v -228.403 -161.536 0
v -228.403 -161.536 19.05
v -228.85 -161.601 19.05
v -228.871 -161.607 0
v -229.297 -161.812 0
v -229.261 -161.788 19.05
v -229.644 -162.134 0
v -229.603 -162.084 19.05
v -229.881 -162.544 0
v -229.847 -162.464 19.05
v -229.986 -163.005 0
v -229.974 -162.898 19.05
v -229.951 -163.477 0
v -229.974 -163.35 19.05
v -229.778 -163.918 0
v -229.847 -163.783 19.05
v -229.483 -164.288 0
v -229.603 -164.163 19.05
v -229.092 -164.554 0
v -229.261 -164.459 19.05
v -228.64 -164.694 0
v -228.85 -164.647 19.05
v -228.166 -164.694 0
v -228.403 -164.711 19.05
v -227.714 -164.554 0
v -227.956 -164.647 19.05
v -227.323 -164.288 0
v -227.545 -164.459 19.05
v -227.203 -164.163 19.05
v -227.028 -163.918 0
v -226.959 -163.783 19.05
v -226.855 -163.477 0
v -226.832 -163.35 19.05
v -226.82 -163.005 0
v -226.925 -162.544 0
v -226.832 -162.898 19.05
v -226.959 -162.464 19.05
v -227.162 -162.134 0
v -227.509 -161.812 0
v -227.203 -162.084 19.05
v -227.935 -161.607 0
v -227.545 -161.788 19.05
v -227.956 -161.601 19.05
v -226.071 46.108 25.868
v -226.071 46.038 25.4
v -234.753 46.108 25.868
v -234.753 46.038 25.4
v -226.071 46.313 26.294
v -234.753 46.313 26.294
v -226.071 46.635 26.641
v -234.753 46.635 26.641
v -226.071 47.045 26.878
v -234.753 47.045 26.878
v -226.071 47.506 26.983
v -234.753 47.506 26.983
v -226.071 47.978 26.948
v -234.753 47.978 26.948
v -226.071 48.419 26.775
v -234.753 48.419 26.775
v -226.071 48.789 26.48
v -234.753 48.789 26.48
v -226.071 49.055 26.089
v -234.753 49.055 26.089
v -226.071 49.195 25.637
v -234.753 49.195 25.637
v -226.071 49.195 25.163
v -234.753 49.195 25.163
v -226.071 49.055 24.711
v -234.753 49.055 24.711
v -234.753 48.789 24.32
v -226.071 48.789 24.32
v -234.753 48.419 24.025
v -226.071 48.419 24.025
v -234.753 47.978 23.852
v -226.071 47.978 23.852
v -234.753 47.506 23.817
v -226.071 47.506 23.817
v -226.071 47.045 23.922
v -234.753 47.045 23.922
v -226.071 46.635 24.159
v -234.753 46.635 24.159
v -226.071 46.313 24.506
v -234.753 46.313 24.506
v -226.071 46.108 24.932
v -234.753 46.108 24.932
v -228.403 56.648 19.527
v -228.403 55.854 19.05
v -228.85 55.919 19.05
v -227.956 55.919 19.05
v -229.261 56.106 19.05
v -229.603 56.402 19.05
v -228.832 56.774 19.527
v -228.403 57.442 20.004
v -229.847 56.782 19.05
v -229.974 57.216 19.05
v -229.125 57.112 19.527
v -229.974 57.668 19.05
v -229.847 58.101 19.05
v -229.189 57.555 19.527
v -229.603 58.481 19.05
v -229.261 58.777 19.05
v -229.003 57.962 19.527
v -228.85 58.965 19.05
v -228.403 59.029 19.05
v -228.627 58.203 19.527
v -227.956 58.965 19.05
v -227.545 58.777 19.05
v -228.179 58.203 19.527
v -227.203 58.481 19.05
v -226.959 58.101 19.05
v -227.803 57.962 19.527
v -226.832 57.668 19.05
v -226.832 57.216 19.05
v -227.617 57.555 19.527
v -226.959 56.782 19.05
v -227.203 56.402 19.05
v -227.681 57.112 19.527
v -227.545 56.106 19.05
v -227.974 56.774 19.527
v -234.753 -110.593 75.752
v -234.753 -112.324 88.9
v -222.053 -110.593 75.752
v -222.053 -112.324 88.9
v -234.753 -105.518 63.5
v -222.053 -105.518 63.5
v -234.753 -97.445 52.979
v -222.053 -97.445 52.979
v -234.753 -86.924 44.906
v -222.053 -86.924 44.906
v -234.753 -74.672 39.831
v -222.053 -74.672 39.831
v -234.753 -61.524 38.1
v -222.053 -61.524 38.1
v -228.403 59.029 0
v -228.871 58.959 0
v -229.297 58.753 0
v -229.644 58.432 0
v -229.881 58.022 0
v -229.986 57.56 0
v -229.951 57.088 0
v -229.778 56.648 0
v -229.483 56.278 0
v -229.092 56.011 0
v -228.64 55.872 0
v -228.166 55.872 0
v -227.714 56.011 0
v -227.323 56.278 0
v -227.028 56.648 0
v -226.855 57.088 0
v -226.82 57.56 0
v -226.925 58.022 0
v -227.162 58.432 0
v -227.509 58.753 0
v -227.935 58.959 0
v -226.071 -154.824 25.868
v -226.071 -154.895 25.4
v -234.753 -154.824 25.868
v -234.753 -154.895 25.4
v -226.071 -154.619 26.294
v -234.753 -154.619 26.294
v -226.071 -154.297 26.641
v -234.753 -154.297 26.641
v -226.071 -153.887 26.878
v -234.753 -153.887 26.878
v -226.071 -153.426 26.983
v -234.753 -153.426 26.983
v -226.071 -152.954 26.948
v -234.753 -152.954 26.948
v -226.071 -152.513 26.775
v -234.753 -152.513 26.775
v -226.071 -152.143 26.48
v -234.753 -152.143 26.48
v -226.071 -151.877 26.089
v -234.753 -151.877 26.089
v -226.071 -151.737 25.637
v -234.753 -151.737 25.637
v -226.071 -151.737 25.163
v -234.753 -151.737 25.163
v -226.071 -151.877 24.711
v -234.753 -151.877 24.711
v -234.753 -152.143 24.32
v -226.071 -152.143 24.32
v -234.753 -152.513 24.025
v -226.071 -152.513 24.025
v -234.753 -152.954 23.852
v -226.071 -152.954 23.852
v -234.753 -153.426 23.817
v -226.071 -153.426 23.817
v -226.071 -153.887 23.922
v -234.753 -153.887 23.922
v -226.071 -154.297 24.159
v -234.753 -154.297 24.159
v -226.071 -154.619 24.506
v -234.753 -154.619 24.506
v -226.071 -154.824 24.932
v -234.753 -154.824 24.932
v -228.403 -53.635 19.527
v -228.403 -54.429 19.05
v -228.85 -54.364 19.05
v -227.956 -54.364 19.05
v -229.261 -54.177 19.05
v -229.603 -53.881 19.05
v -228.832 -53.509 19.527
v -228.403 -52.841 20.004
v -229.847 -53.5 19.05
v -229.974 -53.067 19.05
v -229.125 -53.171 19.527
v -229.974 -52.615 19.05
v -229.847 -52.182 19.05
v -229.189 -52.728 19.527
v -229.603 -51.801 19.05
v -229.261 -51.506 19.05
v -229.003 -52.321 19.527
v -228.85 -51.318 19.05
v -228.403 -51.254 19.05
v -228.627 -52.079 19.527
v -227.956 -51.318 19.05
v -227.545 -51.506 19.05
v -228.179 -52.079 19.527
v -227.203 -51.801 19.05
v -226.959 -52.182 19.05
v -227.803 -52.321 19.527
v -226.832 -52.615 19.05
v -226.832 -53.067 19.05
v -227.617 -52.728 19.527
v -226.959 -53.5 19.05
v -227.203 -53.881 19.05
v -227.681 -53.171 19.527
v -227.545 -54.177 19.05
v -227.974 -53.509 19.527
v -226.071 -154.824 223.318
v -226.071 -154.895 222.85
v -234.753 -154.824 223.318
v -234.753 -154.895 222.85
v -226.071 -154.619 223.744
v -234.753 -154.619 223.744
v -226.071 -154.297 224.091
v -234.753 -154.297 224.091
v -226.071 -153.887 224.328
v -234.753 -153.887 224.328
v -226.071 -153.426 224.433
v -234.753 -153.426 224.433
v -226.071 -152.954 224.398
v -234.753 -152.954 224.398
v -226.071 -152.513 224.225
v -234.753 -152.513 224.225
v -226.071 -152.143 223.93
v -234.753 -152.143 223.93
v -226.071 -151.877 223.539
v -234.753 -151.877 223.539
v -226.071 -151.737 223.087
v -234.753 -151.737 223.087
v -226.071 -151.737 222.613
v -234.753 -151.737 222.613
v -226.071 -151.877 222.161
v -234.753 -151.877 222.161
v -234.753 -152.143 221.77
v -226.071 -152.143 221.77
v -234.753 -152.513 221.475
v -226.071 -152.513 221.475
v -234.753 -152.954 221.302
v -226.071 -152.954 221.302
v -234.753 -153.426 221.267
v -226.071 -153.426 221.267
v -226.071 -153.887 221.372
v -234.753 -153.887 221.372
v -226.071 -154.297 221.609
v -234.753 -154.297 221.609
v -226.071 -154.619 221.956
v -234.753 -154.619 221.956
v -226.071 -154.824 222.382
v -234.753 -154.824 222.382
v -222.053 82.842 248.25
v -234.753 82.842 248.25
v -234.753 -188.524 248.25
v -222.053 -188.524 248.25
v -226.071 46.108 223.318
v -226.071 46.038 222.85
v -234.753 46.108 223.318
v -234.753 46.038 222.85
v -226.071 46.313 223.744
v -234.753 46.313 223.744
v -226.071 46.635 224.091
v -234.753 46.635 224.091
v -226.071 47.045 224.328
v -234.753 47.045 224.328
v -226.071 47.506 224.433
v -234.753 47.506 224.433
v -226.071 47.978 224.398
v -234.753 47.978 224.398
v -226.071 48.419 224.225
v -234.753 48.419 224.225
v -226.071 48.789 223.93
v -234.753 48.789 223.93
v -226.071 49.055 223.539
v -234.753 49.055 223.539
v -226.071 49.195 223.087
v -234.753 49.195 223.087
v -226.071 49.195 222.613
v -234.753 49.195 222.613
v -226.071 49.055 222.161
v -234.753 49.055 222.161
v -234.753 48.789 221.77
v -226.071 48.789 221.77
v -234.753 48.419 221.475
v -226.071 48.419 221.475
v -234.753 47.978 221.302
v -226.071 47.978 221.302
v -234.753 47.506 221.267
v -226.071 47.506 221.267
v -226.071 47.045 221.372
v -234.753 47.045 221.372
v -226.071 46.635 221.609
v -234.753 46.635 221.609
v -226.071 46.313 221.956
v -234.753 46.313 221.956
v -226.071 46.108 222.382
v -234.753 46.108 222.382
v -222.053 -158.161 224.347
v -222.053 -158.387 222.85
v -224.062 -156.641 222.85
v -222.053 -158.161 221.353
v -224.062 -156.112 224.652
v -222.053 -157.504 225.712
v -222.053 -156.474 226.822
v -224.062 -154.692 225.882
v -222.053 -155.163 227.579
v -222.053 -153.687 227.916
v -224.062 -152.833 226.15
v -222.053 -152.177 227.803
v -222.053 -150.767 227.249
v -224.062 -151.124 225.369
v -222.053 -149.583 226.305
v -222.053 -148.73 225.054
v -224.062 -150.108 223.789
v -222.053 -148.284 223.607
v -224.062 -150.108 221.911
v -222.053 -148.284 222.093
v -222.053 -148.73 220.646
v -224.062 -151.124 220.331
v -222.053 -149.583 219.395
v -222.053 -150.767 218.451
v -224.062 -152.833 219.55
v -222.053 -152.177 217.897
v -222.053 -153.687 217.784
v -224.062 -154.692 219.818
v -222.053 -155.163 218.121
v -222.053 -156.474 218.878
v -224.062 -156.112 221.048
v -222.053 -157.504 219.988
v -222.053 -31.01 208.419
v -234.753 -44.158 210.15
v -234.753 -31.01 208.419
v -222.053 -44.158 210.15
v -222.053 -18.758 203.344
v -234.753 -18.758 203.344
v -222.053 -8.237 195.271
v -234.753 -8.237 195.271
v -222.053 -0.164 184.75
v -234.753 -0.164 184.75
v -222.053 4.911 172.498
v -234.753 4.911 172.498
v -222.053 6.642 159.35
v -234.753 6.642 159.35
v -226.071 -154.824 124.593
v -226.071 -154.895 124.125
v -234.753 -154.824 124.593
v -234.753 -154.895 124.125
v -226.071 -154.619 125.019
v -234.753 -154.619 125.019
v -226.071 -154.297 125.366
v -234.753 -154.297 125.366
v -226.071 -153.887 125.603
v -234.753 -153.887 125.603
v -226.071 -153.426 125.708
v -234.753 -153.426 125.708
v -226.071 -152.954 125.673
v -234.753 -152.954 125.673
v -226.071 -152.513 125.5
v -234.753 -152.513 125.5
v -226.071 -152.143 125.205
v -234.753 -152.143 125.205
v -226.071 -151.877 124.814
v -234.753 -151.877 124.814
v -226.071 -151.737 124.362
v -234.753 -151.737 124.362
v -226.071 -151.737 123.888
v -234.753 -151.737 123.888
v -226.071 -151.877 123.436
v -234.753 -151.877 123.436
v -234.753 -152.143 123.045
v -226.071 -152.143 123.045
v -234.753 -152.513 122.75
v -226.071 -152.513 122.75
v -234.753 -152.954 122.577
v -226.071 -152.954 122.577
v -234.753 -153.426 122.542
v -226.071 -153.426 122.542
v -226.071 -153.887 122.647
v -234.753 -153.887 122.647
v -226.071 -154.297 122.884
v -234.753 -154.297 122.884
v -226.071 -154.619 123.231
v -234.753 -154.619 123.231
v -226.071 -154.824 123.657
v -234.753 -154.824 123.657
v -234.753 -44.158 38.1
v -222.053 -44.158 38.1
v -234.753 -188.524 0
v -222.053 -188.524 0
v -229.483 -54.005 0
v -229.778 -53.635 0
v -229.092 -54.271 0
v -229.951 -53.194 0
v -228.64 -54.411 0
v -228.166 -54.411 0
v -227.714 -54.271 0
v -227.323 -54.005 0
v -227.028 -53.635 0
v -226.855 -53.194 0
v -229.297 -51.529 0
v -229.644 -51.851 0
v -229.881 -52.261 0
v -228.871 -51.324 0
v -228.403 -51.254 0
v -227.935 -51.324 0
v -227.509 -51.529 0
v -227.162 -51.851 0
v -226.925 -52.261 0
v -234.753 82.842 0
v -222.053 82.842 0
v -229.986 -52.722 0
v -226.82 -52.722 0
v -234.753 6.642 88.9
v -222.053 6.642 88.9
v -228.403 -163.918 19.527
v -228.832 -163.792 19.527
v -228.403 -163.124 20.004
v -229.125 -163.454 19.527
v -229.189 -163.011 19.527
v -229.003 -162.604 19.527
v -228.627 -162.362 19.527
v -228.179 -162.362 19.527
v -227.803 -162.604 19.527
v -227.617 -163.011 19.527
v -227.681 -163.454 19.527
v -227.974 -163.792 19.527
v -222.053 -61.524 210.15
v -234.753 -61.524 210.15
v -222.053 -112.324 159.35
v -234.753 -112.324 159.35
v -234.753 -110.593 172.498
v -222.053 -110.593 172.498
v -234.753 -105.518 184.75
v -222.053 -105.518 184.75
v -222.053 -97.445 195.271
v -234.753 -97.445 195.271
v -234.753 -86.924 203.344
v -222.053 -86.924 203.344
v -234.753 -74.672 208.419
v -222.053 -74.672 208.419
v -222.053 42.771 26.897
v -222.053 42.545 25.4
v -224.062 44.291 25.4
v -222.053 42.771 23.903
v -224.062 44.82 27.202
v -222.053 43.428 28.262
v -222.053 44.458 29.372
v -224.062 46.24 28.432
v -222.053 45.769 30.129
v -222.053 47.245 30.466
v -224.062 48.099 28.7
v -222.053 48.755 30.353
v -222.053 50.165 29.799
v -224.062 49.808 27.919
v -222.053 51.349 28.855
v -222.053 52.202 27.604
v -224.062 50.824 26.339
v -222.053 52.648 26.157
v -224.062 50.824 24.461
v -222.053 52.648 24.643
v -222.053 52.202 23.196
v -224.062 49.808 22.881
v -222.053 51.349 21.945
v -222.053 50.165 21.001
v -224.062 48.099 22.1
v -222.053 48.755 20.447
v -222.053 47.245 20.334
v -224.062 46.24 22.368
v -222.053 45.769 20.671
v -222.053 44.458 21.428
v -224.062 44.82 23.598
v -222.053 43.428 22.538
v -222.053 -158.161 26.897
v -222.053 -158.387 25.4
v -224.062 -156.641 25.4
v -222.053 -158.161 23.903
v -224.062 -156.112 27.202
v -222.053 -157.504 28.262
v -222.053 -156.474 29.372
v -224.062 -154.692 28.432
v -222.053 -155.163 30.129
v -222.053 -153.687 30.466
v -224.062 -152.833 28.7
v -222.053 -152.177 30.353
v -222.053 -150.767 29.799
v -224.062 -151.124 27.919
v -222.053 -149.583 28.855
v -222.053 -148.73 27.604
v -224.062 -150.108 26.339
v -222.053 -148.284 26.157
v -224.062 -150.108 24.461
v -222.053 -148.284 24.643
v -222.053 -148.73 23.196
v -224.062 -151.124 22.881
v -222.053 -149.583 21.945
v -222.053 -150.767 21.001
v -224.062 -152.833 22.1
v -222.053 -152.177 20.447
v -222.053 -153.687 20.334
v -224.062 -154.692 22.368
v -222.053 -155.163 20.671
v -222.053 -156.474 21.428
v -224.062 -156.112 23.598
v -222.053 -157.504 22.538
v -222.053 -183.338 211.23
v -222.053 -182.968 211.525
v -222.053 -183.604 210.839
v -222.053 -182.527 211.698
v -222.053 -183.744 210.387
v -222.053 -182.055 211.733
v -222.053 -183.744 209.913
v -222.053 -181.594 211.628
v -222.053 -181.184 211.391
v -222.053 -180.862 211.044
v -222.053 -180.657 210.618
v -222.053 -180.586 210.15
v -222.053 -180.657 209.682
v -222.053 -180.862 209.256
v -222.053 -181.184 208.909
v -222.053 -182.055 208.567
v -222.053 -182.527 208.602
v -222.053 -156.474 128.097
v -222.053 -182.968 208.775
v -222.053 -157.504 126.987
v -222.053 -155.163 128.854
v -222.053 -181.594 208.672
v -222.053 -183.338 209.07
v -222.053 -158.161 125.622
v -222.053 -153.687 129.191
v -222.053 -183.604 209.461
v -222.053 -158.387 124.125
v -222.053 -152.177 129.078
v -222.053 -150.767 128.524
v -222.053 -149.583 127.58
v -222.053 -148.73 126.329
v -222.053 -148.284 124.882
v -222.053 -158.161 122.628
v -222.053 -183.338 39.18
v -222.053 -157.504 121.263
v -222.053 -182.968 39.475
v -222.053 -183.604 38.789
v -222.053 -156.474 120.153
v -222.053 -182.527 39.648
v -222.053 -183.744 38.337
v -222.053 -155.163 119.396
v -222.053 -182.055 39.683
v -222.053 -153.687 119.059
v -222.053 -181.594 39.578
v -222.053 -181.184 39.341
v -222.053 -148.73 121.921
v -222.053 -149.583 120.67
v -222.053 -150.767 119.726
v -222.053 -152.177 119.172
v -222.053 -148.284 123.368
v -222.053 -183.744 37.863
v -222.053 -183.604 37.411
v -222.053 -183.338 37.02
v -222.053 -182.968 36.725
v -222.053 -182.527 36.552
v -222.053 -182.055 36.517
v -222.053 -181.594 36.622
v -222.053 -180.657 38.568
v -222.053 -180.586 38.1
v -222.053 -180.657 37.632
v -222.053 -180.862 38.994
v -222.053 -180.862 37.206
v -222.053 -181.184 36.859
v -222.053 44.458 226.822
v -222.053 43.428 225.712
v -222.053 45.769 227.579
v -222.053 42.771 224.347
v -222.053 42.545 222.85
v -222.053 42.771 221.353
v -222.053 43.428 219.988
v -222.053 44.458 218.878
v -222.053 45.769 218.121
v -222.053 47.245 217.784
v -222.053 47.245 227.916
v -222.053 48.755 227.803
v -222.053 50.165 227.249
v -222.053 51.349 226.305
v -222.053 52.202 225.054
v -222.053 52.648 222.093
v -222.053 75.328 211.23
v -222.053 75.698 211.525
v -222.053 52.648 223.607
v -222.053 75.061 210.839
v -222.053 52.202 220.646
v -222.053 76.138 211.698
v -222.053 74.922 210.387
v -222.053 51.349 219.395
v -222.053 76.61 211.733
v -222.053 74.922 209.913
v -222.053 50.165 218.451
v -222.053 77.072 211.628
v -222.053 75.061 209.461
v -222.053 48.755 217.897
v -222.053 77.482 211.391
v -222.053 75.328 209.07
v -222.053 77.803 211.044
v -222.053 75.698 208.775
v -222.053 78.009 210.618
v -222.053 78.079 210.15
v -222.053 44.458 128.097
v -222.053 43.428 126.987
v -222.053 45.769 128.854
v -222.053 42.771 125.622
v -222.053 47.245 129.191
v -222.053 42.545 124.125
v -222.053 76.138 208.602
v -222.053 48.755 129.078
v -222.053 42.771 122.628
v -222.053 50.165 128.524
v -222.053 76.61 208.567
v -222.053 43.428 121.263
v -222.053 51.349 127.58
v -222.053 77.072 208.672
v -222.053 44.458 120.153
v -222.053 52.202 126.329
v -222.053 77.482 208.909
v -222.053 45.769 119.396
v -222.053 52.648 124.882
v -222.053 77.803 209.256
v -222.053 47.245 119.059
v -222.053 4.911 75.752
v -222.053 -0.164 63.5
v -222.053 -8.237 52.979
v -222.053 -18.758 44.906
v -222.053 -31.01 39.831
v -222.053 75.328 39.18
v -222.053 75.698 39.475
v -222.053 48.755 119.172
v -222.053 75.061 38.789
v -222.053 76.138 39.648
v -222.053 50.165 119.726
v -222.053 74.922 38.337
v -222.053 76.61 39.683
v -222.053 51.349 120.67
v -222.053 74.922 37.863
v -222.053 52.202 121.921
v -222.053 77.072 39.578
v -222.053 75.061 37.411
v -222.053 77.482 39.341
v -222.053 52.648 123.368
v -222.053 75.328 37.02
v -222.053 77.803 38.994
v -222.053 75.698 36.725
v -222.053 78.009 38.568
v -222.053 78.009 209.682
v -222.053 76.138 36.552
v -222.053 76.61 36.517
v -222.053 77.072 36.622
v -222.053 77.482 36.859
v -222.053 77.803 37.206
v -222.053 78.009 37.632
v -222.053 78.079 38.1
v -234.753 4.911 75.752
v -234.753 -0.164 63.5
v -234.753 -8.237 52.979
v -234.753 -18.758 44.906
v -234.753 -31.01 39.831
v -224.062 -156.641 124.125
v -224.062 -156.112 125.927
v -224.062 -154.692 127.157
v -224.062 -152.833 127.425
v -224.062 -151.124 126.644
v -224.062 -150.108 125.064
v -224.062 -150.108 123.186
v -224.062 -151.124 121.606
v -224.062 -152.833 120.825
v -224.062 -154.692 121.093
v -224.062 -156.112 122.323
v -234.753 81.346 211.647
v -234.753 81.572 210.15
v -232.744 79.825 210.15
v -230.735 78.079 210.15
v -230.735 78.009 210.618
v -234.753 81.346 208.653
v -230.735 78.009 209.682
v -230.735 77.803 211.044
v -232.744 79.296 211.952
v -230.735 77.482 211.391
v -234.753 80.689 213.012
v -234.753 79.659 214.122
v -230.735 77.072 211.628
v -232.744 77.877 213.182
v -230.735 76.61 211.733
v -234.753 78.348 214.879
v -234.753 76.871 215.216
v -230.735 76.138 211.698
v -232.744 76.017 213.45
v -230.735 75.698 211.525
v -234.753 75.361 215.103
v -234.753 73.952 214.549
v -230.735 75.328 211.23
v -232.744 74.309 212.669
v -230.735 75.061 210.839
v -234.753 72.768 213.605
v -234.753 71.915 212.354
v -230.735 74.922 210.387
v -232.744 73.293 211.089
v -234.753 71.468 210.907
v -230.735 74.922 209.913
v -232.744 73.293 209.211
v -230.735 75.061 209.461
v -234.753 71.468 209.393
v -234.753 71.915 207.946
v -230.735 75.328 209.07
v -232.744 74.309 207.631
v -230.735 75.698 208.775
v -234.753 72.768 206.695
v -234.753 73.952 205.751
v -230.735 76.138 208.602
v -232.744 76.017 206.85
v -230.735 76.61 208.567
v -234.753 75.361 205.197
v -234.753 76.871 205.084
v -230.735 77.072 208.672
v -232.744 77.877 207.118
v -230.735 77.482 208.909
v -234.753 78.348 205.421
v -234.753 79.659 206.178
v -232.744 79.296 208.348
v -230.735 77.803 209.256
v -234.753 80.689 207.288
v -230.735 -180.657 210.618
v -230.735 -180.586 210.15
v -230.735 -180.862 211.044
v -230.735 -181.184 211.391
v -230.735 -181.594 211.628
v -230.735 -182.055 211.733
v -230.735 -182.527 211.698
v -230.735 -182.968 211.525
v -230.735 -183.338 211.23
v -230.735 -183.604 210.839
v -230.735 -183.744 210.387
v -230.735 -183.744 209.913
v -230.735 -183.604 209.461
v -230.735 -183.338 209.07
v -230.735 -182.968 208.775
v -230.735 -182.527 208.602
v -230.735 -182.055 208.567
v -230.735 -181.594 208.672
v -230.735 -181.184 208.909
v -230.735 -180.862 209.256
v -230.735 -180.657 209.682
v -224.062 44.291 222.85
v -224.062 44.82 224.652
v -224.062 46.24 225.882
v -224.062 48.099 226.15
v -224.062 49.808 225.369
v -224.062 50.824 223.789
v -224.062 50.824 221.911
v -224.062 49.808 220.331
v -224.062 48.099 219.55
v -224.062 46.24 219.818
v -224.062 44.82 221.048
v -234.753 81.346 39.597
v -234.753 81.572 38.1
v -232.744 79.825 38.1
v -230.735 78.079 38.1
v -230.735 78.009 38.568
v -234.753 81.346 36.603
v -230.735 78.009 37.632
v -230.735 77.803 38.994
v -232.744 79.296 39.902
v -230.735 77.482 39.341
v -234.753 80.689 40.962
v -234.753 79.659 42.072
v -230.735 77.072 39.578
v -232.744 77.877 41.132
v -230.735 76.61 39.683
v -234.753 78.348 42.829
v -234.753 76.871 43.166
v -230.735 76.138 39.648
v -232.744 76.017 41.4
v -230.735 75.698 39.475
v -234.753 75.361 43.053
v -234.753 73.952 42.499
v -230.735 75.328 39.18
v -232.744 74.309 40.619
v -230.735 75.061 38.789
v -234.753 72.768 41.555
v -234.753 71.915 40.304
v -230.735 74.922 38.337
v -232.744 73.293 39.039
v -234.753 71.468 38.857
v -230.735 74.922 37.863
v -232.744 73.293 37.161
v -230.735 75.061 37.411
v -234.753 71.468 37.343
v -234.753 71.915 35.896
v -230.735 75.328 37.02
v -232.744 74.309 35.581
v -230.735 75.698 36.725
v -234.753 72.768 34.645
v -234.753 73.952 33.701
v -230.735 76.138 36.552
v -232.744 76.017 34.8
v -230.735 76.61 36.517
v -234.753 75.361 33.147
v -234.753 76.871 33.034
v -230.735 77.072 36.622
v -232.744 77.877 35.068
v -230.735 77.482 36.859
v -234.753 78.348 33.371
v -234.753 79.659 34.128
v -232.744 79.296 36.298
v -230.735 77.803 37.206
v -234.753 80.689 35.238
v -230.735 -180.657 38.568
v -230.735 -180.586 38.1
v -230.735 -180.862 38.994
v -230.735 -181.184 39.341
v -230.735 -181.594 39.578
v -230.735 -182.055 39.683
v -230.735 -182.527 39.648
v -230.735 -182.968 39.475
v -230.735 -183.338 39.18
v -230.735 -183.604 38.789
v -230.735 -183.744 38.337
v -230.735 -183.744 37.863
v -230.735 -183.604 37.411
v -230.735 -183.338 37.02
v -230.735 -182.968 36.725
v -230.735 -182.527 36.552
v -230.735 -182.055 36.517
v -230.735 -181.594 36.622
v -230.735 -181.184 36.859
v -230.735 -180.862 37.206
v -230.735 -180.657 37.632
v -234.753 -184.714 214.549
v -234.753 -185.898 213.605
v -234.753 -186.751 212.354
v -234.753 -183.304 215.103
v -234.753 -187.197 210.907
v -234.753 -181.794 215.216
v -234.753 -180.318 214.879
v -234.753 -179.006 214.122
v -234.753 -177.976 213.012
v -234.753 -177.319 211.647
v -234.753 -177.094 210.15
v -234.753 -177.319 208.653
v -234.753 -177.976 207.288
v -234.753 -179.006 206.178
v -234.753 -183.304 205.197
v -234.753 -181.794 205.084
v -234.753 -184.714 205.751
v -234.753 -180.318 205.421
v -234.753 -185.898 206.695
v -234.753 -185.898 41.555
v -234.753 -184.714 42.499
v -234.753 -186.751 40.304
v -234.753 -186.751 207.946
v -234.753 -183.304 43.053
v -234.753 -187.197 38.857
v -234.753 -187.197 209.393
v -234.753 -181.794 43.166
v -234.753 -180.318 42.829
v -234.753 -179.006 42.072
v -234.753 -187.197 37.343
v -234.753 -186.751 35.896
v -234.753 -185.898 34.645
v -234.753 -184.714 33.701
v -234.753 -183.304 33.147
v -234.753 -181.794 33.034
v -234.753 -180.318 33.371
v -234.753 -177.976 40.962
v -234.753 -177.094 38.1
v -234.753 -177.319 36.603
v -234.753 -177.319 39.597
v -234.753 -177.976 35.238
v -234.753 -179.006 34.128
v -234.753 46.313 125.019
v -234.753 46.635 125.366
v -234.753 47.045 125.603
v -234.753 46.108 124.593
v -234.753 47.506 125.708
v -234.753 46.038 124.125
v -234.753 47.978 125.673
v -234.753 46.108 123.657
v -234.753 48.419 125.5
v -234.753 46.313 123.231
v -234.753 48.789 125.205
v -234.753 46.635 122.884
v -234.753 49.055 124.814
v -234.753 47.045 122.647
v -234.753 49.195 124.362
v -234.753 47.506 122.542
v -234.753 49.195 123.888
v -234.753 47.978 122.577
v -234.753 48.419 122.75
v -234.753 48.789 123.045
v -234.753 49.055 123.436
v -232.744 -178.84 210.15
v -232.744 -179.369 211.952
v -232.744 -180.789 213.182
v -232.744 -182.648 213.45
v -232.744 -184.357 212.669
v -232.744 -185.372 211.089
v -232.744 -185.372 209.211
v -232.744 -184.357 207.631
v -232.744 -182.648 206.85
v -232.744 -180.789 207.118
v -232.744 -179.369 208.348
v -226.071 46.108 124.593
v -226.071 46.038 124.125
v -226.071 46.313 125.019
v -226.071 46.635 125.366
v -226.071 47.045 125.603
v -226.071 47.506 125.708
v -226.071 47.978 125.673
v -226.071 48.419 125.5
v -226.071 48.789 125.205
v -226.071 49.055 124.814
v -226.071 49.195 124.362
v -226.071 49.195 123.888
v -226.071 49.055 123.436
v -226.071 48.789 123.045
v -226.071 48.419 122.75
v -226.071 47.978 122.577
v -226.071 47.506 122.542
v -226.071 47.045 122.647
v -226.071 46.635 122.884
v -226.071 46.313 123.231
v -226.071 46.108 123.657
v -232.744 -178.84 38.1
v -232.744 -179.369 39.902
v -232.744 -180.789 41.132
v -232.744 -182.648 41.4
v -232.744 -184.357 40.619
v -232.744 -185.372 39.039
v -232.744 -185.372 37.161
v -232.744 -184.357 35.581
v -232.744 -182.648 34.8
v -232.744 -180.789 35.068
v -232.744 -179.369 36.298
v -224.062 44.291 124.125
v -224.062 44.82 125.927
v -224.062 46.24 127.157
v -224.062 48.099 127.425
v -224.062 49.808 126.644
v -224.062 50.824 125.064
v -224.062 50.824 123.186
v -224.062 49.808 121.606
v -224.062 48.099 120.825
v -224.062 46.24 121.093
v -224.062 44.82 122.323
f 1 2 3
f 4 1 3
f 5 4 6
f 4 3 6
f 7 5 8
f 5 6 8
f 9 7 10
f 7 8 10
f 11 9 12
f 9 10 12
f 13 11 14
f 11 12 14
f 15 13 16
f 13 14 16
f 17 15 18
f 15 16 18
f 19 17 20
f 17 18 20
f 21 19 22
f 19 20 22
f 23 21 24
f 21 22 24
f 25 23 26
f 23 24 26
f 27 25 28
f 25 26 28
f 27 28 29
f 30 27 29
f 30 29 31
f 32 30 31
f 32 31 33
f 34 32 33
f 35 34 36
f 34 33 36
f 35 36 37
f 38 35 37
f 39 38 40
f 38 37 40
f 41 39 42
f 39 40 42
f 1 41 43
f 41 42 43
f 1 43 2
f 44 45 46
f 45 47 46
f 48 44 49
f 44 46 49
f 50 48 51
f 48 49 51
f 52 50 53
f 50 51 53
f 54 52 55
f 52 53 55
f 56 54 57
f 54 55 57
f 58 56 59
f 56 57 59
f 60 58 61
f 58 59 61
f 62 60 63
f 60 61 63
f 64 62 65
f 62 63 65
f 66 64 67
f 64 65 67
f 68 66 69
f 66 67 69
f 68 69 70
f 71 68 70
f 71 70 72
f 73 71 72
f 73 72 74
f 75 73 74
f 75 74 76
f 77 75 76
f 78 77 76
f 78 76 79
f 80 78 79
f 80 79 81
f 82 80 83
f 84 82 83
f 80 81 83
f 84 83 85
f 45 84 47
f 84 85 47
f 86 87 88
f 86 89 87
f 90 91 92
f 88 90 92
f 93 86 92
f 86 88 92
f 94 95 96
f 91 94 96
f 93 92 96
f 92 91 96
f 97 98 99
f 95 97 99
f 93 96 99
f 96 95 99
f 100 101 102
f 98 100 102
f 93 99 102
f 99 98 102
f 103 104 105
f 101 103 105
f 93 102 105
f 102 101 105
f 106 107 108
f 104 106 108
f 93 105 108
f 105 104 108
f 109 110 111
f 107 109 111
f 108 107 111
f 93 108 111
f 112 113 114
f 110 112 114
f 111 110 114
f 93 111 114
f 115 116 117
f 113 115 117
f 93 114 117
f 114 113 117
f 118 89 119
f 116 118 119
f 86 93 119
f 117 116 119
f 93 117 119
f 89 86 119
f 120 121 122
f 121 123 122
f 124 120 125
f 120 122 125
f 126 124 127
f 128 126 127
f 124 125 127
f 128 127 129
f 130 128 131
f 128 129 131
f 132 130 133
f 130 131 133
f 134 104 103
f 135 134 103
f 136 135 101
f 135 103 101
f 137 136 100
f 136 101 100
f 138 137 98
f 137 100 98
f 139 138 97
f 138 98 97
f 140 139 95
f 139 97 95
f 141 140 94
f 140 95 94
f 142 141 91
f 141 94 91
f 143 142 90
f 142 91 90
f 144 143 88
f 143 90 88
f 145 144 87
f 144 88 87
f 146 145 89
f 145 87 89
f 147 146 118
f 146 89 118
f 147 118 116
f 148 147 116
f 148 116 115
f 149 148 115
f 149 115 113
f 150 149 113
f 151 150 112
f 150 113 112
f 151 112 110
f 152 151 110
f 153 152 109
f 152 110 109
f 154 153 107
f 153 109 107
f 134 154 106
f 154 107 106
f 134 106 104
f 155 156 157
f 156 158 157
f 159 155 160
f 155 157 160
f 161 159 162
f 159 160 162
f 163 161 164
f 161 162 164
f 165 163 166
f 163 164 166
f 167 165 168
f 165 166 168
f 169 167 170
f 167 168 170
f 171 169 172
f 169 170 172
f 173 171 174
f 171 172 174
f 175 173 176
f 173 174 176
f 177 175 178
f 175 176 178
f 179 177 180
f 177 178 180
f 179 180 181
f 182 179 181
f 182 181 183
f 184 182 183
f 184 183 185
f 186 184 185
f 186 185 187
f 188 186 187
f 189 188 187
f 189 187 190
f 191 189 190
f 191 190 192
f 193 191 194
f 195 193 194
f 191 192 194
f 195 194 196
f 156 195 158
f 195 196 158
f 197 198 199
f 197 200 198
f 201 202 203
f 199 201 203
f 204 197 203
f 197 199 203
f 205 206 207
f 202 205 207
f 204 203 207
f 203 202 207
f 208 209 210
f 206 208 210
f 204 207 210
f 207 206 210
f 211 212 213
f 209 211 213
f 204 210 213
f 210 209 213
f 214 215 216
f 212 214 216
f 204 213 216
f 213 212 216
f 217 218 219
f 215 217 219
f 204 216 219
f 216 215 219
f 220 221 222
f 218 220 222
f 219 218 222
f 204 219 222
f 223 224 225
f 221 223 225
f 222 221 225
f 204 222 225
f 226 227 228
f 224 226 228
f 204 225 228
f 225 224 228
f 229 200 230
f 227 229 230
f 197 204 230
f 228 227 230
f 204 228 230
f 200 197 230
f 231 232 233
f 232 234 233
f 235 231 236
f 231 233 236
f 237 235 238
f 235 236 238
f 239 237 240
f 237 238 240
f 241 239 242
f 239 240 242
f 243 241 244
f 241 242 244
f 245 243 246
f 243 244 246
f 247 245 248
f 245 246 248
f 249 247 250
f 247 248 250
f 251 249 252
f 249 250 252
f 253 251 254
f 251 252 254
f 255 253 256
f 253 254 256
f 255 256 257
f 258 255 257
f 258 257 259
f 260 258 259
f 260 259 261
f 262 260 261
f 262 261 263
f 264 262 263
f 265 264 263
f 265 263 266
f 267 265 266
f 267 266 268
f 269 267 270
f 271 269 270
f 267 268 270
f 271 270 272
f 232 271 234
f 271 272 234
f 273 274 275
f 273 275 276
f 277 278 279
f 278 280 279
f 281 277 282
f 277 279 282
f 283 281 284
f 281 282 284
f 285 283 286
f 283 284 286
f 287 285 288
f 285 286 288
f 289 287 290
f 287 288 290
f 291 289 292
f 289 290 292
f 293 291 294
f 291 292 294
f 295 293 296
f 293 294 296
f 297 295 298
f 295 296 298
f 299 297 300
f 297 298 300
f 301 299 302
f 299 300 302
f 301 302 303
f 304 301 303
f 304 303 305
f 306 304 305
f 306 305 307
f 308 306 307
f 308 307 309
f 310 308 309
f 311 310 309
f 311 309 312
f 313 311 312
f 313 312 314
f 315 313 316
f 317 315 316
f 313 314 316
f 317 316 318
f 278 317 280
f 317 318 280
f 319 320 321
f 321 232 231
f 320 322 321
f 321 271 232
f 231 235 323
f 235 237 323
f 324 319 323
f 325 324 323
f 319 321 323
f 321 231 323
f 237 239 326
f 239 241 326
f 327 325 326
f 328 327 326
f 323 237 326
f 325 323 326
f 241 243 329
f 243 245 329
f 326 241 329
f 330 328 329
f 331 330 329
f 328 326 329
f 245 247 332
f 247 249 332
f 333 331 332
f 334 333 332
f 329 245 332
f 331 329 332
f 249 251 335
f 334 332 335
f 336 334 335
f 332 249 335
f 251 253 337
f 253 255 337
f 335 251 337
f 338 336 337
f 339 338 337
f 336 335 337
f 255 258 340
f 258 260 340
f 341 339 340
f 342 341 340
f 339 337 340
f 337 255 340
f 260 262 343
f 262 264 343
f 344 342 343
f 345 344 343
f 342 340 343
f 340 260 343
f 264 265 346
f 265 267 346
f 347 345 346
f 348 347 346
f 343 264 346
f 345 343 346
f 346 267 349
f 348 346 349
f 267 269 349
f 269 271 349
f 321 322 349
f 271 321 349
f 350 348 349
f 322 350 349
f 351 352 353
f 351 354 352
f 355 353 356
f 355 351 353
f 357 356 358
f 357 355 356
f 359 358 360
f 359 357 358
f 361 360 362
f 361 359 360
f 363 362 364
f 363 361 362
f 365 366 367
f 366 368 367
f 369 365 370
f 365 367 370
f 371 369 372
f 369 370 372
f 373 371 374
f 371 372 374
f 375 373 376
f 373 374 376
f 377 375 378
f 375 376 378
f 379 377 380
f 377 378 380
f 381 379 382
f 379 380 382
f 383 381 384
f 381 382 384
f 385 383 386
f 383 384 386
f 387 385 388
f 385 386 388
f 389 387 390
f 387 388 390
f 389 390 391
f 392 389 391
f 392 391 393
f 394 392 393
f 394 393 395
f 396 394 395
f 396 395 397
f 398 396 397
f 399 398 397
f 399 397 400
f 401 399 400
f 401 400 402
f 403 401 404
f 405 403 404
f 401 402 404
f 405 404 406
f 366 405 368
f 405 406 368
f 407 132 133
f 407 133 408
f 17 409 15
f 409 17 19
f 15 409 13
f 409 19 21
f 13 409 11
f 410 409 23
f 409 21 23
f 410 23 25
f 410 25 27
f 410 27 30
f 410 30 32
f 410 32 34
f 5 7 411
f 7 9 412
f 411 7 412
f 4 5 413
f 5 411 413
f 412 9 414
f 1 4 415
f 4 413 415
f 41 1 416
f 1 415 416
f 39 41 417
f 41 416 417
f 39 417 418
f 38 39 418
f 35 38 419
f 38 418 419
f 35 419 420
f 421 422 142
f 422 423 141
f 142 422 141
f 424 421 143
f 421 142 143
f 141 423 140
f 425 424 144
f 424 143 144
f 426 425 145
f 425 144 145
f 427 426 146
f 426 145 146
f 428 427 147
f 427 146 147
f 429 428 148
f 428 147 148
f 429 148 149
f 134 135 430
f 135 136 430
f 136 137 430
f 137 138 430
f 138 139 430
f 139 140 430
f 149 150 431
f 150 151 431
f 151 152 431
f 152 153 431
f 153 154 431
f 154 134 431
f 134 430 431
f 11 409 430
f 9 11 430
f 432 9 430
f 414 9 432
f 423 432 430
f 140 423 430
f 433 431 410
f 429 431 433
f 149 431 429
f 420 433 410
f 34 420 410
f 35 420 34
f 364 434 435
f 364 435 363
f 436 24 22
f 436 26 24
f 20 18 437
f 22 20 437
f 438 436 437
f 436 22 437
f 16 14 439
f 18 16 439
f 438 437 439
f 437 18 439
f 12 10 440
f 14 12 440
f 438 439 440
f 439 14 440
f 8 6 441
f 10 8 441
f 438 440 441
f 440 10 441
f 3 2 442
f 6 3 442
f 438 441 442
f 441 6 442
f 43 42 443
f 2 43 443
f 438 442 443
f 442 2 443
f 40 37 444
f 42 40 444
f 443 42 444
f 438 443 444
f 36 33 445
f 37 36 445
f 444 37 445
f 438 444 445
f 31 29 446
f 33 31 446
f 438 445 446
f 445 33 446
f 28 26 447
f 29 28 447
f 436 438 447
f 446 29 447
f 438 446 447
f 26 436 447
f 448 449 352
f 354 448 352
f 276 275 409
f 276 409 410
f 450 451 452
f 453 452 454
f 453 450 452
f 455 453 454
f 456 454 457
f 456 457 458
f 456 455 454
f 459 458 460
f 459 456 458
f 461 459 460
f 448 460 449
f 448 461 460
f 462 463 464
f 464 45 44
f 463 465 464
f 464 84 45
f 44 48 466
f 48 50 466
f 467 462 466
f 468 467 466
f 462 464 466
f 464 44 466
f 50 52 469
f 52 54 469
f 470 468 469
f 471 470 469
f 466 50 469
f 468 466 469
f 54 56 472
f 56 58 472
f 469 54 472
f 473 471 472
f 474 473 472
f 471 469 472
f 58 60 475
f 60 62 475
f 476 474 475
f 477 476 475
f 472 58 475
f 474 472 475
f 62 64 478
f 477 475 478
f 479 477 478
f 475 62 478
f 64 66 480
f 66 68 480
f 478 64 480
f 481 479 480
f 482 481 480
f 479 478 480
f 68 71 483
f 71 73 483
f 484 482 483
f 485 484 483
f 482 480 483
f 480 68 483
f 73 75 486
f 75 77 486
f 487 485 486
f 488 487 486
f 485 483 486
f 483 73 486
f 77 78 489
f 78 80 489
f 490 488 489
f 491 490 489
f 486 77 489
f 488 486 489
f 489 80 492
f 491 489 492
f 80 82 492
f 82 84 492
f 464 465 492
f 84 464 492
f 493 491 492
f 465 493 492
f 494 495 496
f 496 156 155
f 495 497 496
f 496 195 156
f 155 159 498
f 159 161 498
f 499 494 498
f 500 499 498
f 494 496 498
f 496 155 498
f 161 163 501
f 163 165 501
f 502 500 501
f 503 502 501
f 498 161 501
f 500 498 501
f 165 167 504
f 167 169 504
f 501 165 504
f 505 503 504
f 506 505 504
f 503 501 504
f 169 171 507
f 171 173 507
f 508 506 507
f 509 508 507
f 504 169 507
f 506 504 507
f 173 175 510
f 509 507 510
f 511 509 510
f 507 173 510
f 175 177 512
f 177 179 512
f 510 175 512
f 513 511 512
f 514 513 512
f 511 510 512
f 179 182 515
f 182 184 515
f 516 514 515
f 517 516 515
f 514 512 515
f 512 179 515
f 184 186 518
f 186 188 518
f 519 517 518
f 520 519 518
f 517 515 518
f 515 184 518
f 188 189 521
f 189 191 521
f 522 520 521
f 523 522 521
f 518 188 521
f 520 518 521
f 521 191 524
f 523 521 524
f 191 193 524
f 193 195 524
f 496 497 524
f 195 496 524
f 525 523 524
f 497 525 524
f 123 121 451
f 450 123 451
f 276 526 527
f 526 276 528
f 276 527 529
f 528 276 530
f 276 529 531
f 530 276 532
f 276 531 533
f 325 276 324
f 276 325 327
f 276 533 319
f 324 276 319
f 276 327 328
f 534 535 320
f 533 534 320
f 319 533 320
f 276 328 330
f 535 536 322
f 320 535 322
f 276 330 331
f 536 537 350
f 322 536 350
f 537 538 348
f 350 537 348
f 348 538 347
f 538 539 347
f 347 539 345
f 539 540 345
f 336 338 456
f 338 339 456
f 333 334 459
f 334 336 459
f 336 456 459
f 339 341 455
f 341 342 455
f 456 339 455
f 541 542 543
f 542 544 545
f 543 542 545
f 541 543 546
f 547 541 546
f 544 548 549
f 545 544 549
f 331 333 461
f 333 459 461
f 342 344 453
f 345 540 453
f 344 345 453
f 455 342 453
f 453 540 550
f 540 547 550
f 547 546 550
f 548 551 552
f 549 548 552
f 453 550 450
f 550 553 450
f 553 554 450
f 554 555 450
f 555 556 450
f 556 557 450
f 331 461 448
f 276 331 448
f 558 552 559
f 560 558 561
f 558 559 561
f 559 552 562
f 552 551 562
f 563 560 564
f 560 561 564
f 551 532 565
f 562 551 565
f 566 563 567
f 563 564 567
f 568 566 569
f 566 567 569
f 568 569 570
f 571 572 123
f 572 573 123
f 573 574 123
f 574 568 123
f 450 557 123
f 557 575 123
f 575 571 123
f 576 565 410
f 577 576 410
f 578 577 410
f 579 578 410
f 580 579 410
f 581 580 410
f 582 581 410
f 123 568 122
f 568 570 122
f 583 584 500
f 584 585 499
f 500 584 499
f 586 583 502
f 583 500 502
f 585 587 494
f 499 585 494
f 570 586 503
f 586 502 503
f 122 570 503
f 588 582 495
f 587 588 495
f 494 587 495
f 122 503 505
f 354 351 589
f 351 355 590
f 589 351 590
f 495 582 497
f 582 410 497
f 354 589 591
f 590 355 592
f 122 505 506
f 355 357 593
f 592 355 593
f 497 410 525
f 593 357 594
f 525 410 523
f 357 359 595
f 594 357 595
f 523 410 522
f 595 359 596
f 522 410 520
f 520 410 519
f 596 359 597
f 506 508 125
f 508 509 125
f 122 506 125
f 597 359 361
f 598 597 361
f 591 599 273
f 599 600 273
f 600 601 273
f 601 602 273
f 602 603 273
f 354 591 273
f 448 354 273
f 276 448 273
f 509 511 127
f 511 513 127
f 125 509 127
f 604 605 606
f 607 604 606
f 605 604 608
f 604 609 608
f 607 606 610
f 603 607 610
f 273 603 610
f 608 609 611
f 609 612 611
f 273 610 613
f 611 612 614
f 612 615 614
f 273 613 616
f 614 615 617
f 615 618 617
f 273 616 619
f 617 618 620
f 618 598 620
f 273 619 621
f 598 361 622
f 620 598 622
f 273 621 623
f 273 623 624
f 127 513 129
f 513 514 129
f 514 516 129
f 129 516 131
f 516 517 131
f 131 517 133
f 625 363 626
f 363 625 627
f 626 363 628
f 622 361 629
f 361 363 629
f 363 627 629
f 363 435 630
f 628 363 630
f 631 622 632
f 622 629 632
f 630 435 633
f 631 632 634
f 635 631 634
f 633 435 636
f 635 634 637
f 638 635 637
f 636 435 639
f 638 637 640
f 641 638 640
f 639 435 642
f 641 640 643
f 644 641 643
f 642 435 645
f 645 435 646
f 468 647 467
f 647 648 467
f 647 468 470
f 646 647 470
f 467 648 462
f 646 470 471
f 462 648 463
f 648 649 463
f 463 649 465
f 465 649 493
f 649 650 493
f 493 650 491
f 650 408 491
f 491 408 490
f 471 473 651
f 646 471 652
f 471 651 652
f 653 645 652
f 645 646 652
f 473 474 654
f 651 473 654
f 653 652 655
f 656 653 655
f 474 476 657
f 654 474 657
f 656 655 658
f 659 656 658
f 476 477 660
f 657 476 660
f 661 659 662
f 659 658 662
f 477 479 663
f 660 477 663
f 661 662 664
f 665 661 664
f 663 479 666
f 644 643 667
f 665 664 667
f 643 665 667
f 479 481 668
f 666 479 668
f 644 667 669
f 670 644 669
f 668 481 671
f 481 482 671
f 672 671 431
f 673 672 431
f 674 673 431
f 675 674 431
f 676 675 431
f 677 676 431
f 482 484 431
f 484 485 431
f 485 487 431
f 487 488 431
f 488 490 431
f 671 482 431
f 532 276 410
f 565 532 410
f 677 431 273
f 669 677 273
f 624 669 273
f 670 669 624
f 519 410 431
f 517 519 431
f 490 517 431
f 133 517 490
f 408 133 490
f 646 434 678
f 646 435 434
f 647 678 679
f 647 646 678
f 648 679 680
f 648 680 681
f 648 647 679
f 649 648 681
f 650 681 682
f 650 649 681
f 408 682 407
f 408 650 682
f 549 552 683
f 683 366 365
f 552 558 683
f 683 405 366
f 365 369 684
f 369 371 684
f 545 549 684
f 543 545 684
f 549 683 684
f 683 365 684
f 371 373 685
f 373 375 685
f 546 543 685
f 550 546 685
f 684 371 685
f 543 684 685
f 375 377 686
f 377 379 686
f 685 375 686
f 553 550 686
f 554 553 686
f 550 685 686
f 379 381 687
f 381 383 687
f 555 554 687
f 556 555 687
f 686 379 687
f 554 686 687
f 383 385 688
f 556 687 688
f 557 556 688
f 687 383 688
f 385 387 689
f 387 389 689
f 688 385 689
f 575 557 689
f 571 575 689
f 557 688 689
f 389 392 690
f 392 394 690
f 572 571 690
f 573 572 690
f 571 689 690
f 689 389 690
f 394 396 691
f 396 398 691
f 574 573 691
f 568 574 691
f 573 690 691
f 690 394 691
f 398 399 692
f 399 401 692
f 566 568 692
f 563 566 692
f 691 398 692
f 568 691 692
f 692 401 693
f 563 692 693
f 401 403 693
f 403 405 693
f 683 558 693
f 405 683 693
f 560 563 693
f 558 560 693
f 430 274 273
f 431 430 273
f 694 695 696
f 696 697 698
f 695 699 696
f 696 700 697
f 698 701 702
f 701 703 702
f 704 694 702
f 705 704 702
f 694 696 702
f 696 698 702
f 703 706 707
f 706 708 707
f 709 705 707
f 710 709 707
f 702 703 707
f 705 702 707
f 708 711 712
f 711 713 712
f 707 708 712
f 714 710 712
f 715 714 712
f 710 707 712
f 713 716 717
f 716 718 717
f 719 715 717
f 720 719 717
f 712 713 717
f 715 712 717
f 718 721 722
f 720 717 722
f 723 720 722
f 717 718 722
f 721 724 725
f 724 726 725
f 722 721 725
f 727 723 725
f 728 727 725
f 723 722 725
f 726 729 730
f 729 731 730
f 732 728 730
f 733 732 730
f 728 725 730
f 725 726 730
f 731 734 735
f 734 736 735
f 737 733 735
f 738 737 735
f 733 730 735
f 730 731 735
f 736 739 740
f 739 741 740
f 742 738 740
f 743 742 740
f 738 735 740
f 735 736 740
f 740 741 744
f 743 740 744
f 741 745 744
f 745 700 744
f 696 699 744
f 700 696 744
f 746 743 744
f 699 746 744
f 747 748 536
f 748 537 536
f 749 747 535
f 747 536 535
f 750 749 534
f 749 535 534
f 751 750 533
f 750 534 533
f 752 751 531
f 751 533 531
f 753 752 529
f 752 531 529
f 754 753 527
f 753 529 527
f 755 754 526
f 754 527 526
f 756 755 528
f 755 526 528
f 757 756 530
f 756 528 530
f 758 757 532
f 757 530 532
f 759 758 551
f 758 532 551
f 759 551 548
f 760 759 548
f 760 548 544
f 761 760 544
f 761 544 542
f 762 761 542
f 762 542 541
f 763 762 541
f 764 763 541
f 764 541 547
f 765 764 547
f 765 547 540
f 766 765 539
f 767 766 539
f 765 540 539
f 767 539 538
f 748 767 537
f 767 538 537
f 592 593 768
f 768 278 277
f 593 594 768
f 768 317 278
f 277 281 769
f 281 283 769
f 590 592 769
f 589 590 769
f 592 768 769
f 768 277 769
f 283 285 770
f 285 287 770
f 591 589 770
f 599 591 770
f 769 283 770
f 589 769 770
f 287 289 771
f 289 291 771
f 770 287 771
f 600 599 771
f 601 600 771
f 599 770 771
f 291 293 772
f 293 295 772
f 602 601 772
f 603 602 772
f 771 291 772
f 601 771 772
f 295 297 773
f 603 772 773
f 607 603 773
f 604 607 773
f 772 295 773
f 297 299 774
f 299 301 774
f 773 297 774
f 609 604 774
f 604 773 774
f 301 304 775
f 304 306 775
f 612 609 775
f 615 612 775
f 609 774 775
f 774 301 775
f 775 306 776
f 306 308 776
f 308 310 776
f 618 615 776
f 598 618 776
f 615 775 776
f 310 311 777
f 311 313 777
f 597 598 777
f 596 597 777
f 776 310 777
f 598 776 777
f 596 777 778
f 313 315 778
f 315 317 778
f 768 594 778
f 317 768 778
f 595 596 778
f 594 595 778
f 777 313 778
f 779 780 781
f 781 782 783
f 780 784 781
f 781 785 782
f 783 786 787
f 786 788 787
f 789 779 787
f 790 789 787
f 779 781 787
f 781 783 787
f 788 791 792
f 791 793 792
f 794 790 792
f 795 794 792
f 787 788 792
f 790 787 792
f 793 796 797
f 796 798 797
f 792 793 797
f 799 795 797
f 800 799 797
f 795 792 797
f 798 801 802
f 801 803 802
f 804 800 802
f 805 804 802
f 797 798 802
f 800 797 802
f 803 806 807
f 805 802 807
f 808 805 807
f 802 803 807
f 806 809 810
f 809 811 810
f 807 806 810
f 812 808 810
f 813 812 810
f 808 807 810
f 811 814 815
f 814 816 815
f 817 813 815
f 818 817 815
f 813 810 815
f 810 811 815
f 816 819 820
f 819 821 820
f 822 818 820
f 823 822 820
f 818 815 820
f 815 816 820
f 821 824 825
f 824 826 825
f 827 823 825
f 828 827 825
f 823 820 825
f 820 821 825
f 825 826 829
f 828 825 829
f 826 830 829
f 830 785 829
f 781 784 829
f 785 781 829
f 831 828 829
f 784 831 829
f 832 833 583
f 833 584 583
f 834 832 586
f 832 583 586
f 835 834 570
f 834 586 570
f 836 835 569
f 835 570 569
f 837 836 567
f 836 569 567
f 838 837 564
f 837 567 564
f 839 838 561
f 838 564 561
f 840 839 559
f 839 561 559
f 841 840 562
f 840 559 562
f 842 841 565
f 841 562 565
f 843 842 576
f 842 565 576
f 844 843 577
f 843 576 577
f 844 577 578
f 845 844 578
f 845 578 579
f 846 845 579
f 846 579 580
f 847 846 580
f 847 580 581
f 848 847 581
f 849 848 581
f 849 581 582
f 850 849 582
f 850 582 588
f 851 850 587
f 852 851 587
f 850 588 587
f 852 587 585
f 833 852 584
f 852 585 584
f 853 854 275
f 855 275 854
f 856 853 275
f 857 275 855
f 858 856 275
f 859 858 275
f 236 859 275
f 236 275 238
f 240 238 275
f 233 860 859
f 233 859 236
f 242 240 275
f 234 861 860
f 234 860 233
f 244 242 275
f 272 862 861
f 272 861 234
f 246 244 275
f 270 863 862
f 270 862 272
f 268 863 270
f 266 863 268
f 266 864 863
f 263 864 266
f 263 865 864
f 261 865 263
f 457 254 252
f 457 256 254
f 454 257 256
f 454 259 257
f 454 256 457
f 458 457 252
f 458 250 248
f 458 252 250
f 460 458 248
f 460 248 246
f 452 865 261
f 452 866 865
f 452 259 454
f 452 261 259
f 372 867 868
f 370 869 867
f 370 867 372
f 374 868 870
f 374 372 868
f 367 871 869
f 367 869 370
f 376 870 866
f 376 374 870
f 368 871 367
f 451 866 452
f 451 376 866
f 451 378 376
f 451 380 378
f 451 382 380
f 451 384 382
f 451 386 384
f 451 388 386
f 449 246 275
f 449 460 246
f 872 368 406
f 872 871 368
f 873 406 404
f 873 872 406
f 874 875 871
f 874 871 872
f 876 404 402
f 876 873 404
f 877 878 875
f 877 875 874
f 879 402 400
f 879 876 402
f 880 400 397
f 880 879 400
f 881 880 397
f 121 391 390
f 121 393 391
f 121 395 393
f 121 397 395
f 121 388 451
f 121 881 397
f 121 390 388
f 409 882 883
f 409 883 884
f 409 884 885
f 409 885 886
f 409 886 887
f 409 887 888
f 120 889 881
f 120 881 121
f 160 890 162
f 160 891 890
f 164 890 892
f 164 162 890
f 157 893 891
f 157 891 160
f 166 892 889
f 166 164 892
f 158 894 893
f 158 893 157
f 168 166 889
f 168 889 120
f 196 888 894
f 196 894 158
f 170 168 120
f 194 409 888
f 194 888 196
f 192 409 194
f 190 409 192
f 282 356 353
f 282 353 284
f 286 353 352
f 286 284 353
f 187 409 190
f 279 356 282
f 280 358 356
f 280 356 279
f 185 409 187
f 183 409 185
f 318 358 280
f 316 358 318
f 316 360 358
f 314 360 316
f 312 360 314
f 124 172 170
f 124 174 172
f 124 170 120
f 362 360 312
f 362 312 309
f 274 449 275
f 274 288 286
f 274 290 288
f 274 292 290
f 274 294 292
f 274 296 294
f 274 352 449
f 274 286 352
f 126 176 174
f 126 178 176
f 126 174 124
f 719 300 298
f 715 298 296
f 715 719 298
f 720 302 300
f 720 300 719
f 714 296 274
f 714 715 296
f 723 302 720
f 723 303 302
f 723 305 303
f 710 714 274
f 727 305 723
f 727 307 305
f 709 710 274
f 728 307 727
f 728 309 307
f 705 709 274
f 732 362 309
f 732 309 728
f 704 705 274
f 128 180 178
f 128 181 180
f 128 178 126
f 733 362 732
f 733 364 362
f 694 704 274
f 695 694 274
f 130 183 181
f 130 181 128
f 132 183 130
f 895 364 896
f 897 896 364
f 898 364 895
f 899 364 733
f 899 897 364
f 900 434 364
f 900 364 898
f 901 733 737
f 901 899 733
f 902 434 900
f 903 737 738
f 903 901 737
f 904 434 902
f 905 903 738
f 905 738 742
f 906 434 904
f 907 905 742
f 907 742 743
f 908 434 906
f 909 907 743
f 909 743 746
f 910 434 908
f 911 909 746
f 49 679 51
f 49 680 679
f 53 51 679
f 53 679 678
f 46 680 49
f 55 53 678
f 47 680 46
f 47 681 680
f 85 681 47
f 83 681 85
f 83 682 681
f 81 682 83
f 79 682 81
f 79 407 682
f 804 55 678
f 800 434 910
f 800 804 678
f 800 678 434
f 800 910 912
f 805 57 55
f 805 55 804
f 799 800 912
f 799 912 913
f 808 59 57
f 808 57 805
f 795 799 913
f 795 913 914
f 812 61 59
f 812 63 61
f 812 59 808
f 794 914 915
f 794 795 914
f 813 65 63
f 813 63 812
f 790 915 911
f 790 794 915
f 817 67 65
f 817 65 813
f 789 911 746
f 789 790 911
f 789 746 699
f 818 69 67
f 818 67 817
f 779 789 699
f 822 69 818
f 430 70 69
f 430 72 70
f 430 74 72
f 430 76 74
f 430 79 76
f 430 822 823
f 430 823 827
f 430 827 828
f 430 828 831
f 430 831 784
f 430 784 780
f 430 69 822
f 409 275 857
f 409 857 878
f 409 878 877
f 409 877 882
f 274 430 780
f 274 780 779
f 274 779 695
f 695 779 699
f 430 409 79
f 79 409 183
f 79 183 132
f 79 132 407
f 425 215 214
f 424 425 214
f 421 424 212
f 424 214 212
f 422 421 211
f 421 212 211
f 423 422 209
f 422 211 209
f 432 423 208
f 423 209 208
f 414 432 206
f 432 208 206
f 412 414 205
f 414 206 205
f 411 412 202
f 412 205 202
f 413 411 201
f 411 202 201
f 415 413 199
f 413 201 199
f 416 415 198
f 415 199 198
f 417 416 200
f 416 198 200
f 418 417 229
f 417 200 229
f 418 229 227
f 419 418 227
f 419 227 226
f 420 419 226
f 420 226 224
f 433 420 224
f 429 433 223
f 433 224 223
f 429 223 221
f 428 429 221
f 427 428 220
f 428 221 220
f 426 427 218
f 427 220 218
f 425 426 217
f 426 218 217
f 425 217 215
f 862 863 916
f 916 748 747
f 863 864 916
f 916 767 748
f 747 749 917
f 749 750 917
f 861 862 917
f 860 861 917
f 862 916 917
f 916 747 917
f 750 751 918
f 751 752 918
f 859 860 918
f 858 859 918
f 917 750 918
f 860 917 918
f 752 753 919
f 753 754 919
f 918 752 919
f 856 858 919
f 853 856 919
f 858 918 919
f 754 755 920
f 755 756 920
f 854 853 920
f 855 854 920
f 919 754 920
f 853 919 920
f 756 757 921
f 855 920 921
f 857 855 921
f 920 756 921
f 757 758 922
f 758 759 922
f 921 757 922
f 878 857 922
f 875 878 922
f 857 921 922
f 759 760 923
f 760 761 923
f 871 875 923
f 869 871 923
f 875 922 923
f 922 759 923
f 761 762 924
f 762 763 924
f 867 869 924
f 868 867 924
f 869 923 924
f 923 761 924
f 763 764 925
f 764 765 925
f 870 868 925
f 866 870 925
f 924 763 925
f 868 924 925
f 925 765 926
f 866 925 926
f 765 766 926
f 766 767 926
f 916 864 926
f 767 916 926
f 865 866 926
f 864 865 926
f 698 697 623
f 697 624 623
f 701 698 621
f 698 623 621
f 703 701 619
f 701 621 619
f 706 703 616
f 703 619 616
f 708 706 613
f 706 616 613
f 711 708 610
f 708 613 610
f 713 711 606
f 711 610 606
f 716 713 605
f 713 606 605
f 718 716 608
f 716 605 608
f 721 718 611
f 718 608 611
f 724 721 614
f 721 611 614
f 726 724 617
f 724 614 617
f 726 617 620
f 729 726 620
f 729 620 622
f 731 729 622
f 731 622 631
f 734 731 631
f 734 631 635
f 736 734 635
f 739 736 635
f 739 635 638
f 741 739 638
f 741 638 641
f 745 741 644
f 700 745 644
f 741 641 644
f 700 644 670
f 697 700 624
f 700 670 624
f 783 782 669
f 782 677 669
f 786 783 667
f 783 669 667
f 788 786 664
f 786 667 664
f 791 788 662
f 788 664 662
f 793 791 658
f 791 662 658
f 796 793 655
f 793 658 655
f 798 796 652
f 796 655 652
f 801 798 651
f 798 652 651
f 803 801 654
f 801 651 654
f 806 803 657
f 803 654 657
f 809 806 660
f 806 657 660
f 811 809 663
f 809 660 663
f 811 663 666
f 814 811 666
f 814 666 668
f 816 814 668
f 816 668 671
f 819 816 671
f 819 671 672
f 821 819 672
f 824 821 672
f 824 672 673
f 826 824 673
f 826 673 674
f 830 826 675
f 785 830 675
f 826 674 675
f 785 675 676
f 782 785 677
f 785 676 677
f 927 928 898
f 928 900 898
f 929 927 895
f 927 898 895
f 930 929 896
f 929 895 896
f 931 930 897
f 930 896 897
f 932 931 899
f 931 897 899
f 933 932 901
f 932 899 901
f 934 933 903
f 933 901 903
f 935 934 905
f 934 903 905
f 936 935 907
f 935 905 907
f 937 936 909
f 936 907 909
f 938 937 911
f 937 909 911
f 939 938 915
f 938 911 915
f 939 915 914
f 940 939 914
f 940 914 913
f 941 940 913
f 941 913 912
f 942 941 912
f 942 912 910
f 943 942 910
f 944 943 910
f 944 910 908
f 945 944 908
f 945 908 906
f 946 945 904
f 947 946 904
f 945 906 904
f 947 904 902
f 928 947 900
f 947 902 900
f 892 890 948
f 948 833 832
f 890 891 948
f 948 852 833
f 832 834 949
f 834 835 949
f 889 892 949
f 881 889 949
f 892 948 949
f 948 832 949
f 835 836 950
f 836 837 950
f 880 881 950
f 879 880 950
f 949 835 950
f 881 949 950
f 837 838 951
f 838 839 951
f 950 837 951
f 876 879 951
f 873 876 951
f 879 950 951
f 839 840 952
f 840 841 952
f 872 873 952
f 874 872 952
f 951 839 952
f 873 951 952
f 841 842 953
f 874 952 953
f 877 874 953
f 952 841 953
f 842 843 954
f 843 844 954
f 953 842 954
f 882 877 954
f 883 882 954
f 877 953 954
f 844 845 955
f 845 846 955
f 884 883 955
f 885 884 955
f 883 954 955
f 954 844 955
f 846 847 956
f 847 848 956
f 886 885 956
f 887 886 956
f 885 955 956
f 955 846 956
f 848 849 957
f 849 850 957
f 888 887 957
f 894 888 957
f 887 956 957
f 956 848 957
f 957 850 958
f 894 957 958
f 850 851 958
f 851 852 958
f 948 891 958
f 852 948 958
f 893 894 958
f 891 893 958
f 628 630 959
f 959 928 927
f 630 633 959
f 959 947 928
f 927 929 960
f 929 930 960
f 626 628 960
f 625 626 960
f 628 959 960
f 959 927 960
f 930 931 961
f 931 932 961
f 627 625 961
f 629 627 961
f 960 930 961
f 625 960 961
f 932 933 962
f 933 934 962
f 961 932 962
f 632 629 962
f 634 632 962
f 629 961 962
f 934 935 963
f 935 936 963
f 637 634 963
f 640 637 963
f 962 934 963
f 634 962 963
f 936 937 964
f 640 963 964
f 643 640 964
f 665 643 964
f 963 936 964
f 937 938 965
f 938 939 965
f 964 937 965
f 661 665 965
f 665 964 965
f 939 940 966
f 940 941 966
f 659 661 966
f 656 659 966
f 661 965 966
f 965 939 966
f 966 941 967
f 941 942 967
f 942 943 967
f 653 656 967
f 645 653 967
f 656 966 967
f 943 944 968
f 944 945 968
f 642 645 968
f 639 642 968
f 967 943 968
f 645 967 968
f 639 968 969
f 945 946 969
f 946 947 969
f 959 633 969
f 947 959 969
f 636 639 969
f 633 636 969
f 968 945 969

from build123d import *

# Parameters (mm, degrees)
SKETCH1_W           = 12.7
SKETCH1_H           = 271.365530146
BOSS_EXTRUDE1_DEPTH = 248.25
SKETCH2_W           = 172.05
SKETCH2_H           = 118.965530146
CUT_EXTRUDE1_DEPTH  = 13.7
FILLET1_R           = 50.8
HOLE1_D             = 3.175
HOLE1_DEPTH         = 31.75
HOLE1_CSINK_D       = 10.16
HOLE1_CSINK_ANGLE   = 82
HOLE1_TIP           = 0.953866233
HOLE2_D             = 3.175
HOLE2_DEPTH         = 31.75
HOLE2_CSINK_D       = 10.16
HOLE2_CSINK_ANGLE   = 82
HOLE2_TIP           = 0.953866233
HOLE3_D             = 3.175
HOLE3_DEPTH         = 31.75
HOLE3_CSINK_D       = 10.16
HOLE3_CSINK_ANGLE   = 82
HOLE3_TIP           = 0.953866233


with BuildPart() as part:
    # Sketch1 → Boss-Extrude1 (new body)
    with BuildSketch(Plane.XY):
        with Locations((-228.402967181, -52.841023691)):
            Rectangle(SKETCH1_W, SKETCH1_H)
    extrude(amount=BOSS_EXTRUDE1_DEPTH)

    # Sketch2 → Cut-Extrude1 (cut, through all)
    with BuildSketch(Plane.ZY.offset(234.752967181)):
        with Locations((124.125, -52.841023691)):
            Rectangle(SKETCH2_W, SKETCH2_H)
    extrude(amount=-CUT_EXTRUDE1_DEPTH, mode=Mode.SUBTRACT)

    # Fillet1
    fillet1_edges = [part.edges().sort_by_distance(p)[0] for p in [
        (-228.402967181, 6.641741382, 210.15),
        (-228.402967181, -112.323788764, 210.15),
        (-228.402967181, -112.323788764, 38.1),
        (-228.402967181, 6.641741382, 38.1),
    ]]
    fillet(fillet1_edges, radius=FILLET1_R)

    # Hole1
    with Locations(Plane(origin=(181.039434513, -52.974999997, -12.7), x_dir=(0, -1, 0), z_dir=(0, 0, -1))):
        with Locations((129.198788767, 384.042401694), (-129.466741379, 384.042401694), (-129.466741379, 304.786761906), (-110.416741379, 409.442401694), (-0.133976306, 409.442401694), (110.148788767, 409.442401694), (129.198788767, 304.786761906)):
            CounterSinkHole(HOLE1_D / 2, HOLE1_CSINK_D / 2, depth=HOLE1_DEPTH, counter_sink_angle=HOLE1_CSINK_ANGLE)
            with Locations((0, 0, -(HOLE1_DEPTH + HOLE1_TIP / 2))):  # 118° drill point
                Cone(0, HOLE1_D / 2, HOLE1_TIP, mode=Mode.SUBTRACT)

    # Hole2
    with Locations(Plane(origin=(-234.752967181, -52.974999997, -1090.512770337), x_dir=(0, -1, 0), z_dir=(-1, 0, 0))):
        with Locations((-129.466741379, 1300.662770337), (-129.466741379, 1128.612770337), (129.198788767, 1128.612770337), (129.198788767, 1300.662770337)):
            CounterSinkHole(HOLE2_D / 2, HOLE2_CSINK_D / 2, depth=HOLE2_DEPTH, counter_sink_angle=HOLE2_CSINK_ANGLE)
            with Locations((0, 0, -(HOLE2_DEPTH + HOLE2_TIP / 2))):  # 118° drill point
                Cone(0, HOLE2_D / 2, HOLE2_TIP, mode=Mode.SUBTRACT)

    # Hole3
    with Locations(Plane(origin=(-222.052967181, -52.974999997, -1090.512770337), x_dir=(0, 1, 0), z_dir=(1, 0, 0))):
        with Locations((-100.332047386, 1313.362770337), (100.599999997, 1313.362770337), (100.599999997, 1115.912770337), (100.599999997, 1214.637770337), (-100.332047386, 1214.637770337), (-100.332047386, 1115.912770337)):
            CounterSinkHole(HOLE3_D / 2, HOLE3_CSINK_D / 2, depth=HOLE3_DEPTH, counter_sink_angle=HOLE3_CSINK_ANGLE)
            with Locations((0, 0, -(HOLE3_DEPTH + HOLE3_TIP / 2))):  # 118° drill point
                Cone(0, HOLE3_D / 2, HOLE3_TIP, mode=Mode.SUBTRACT)


solid = part.part
